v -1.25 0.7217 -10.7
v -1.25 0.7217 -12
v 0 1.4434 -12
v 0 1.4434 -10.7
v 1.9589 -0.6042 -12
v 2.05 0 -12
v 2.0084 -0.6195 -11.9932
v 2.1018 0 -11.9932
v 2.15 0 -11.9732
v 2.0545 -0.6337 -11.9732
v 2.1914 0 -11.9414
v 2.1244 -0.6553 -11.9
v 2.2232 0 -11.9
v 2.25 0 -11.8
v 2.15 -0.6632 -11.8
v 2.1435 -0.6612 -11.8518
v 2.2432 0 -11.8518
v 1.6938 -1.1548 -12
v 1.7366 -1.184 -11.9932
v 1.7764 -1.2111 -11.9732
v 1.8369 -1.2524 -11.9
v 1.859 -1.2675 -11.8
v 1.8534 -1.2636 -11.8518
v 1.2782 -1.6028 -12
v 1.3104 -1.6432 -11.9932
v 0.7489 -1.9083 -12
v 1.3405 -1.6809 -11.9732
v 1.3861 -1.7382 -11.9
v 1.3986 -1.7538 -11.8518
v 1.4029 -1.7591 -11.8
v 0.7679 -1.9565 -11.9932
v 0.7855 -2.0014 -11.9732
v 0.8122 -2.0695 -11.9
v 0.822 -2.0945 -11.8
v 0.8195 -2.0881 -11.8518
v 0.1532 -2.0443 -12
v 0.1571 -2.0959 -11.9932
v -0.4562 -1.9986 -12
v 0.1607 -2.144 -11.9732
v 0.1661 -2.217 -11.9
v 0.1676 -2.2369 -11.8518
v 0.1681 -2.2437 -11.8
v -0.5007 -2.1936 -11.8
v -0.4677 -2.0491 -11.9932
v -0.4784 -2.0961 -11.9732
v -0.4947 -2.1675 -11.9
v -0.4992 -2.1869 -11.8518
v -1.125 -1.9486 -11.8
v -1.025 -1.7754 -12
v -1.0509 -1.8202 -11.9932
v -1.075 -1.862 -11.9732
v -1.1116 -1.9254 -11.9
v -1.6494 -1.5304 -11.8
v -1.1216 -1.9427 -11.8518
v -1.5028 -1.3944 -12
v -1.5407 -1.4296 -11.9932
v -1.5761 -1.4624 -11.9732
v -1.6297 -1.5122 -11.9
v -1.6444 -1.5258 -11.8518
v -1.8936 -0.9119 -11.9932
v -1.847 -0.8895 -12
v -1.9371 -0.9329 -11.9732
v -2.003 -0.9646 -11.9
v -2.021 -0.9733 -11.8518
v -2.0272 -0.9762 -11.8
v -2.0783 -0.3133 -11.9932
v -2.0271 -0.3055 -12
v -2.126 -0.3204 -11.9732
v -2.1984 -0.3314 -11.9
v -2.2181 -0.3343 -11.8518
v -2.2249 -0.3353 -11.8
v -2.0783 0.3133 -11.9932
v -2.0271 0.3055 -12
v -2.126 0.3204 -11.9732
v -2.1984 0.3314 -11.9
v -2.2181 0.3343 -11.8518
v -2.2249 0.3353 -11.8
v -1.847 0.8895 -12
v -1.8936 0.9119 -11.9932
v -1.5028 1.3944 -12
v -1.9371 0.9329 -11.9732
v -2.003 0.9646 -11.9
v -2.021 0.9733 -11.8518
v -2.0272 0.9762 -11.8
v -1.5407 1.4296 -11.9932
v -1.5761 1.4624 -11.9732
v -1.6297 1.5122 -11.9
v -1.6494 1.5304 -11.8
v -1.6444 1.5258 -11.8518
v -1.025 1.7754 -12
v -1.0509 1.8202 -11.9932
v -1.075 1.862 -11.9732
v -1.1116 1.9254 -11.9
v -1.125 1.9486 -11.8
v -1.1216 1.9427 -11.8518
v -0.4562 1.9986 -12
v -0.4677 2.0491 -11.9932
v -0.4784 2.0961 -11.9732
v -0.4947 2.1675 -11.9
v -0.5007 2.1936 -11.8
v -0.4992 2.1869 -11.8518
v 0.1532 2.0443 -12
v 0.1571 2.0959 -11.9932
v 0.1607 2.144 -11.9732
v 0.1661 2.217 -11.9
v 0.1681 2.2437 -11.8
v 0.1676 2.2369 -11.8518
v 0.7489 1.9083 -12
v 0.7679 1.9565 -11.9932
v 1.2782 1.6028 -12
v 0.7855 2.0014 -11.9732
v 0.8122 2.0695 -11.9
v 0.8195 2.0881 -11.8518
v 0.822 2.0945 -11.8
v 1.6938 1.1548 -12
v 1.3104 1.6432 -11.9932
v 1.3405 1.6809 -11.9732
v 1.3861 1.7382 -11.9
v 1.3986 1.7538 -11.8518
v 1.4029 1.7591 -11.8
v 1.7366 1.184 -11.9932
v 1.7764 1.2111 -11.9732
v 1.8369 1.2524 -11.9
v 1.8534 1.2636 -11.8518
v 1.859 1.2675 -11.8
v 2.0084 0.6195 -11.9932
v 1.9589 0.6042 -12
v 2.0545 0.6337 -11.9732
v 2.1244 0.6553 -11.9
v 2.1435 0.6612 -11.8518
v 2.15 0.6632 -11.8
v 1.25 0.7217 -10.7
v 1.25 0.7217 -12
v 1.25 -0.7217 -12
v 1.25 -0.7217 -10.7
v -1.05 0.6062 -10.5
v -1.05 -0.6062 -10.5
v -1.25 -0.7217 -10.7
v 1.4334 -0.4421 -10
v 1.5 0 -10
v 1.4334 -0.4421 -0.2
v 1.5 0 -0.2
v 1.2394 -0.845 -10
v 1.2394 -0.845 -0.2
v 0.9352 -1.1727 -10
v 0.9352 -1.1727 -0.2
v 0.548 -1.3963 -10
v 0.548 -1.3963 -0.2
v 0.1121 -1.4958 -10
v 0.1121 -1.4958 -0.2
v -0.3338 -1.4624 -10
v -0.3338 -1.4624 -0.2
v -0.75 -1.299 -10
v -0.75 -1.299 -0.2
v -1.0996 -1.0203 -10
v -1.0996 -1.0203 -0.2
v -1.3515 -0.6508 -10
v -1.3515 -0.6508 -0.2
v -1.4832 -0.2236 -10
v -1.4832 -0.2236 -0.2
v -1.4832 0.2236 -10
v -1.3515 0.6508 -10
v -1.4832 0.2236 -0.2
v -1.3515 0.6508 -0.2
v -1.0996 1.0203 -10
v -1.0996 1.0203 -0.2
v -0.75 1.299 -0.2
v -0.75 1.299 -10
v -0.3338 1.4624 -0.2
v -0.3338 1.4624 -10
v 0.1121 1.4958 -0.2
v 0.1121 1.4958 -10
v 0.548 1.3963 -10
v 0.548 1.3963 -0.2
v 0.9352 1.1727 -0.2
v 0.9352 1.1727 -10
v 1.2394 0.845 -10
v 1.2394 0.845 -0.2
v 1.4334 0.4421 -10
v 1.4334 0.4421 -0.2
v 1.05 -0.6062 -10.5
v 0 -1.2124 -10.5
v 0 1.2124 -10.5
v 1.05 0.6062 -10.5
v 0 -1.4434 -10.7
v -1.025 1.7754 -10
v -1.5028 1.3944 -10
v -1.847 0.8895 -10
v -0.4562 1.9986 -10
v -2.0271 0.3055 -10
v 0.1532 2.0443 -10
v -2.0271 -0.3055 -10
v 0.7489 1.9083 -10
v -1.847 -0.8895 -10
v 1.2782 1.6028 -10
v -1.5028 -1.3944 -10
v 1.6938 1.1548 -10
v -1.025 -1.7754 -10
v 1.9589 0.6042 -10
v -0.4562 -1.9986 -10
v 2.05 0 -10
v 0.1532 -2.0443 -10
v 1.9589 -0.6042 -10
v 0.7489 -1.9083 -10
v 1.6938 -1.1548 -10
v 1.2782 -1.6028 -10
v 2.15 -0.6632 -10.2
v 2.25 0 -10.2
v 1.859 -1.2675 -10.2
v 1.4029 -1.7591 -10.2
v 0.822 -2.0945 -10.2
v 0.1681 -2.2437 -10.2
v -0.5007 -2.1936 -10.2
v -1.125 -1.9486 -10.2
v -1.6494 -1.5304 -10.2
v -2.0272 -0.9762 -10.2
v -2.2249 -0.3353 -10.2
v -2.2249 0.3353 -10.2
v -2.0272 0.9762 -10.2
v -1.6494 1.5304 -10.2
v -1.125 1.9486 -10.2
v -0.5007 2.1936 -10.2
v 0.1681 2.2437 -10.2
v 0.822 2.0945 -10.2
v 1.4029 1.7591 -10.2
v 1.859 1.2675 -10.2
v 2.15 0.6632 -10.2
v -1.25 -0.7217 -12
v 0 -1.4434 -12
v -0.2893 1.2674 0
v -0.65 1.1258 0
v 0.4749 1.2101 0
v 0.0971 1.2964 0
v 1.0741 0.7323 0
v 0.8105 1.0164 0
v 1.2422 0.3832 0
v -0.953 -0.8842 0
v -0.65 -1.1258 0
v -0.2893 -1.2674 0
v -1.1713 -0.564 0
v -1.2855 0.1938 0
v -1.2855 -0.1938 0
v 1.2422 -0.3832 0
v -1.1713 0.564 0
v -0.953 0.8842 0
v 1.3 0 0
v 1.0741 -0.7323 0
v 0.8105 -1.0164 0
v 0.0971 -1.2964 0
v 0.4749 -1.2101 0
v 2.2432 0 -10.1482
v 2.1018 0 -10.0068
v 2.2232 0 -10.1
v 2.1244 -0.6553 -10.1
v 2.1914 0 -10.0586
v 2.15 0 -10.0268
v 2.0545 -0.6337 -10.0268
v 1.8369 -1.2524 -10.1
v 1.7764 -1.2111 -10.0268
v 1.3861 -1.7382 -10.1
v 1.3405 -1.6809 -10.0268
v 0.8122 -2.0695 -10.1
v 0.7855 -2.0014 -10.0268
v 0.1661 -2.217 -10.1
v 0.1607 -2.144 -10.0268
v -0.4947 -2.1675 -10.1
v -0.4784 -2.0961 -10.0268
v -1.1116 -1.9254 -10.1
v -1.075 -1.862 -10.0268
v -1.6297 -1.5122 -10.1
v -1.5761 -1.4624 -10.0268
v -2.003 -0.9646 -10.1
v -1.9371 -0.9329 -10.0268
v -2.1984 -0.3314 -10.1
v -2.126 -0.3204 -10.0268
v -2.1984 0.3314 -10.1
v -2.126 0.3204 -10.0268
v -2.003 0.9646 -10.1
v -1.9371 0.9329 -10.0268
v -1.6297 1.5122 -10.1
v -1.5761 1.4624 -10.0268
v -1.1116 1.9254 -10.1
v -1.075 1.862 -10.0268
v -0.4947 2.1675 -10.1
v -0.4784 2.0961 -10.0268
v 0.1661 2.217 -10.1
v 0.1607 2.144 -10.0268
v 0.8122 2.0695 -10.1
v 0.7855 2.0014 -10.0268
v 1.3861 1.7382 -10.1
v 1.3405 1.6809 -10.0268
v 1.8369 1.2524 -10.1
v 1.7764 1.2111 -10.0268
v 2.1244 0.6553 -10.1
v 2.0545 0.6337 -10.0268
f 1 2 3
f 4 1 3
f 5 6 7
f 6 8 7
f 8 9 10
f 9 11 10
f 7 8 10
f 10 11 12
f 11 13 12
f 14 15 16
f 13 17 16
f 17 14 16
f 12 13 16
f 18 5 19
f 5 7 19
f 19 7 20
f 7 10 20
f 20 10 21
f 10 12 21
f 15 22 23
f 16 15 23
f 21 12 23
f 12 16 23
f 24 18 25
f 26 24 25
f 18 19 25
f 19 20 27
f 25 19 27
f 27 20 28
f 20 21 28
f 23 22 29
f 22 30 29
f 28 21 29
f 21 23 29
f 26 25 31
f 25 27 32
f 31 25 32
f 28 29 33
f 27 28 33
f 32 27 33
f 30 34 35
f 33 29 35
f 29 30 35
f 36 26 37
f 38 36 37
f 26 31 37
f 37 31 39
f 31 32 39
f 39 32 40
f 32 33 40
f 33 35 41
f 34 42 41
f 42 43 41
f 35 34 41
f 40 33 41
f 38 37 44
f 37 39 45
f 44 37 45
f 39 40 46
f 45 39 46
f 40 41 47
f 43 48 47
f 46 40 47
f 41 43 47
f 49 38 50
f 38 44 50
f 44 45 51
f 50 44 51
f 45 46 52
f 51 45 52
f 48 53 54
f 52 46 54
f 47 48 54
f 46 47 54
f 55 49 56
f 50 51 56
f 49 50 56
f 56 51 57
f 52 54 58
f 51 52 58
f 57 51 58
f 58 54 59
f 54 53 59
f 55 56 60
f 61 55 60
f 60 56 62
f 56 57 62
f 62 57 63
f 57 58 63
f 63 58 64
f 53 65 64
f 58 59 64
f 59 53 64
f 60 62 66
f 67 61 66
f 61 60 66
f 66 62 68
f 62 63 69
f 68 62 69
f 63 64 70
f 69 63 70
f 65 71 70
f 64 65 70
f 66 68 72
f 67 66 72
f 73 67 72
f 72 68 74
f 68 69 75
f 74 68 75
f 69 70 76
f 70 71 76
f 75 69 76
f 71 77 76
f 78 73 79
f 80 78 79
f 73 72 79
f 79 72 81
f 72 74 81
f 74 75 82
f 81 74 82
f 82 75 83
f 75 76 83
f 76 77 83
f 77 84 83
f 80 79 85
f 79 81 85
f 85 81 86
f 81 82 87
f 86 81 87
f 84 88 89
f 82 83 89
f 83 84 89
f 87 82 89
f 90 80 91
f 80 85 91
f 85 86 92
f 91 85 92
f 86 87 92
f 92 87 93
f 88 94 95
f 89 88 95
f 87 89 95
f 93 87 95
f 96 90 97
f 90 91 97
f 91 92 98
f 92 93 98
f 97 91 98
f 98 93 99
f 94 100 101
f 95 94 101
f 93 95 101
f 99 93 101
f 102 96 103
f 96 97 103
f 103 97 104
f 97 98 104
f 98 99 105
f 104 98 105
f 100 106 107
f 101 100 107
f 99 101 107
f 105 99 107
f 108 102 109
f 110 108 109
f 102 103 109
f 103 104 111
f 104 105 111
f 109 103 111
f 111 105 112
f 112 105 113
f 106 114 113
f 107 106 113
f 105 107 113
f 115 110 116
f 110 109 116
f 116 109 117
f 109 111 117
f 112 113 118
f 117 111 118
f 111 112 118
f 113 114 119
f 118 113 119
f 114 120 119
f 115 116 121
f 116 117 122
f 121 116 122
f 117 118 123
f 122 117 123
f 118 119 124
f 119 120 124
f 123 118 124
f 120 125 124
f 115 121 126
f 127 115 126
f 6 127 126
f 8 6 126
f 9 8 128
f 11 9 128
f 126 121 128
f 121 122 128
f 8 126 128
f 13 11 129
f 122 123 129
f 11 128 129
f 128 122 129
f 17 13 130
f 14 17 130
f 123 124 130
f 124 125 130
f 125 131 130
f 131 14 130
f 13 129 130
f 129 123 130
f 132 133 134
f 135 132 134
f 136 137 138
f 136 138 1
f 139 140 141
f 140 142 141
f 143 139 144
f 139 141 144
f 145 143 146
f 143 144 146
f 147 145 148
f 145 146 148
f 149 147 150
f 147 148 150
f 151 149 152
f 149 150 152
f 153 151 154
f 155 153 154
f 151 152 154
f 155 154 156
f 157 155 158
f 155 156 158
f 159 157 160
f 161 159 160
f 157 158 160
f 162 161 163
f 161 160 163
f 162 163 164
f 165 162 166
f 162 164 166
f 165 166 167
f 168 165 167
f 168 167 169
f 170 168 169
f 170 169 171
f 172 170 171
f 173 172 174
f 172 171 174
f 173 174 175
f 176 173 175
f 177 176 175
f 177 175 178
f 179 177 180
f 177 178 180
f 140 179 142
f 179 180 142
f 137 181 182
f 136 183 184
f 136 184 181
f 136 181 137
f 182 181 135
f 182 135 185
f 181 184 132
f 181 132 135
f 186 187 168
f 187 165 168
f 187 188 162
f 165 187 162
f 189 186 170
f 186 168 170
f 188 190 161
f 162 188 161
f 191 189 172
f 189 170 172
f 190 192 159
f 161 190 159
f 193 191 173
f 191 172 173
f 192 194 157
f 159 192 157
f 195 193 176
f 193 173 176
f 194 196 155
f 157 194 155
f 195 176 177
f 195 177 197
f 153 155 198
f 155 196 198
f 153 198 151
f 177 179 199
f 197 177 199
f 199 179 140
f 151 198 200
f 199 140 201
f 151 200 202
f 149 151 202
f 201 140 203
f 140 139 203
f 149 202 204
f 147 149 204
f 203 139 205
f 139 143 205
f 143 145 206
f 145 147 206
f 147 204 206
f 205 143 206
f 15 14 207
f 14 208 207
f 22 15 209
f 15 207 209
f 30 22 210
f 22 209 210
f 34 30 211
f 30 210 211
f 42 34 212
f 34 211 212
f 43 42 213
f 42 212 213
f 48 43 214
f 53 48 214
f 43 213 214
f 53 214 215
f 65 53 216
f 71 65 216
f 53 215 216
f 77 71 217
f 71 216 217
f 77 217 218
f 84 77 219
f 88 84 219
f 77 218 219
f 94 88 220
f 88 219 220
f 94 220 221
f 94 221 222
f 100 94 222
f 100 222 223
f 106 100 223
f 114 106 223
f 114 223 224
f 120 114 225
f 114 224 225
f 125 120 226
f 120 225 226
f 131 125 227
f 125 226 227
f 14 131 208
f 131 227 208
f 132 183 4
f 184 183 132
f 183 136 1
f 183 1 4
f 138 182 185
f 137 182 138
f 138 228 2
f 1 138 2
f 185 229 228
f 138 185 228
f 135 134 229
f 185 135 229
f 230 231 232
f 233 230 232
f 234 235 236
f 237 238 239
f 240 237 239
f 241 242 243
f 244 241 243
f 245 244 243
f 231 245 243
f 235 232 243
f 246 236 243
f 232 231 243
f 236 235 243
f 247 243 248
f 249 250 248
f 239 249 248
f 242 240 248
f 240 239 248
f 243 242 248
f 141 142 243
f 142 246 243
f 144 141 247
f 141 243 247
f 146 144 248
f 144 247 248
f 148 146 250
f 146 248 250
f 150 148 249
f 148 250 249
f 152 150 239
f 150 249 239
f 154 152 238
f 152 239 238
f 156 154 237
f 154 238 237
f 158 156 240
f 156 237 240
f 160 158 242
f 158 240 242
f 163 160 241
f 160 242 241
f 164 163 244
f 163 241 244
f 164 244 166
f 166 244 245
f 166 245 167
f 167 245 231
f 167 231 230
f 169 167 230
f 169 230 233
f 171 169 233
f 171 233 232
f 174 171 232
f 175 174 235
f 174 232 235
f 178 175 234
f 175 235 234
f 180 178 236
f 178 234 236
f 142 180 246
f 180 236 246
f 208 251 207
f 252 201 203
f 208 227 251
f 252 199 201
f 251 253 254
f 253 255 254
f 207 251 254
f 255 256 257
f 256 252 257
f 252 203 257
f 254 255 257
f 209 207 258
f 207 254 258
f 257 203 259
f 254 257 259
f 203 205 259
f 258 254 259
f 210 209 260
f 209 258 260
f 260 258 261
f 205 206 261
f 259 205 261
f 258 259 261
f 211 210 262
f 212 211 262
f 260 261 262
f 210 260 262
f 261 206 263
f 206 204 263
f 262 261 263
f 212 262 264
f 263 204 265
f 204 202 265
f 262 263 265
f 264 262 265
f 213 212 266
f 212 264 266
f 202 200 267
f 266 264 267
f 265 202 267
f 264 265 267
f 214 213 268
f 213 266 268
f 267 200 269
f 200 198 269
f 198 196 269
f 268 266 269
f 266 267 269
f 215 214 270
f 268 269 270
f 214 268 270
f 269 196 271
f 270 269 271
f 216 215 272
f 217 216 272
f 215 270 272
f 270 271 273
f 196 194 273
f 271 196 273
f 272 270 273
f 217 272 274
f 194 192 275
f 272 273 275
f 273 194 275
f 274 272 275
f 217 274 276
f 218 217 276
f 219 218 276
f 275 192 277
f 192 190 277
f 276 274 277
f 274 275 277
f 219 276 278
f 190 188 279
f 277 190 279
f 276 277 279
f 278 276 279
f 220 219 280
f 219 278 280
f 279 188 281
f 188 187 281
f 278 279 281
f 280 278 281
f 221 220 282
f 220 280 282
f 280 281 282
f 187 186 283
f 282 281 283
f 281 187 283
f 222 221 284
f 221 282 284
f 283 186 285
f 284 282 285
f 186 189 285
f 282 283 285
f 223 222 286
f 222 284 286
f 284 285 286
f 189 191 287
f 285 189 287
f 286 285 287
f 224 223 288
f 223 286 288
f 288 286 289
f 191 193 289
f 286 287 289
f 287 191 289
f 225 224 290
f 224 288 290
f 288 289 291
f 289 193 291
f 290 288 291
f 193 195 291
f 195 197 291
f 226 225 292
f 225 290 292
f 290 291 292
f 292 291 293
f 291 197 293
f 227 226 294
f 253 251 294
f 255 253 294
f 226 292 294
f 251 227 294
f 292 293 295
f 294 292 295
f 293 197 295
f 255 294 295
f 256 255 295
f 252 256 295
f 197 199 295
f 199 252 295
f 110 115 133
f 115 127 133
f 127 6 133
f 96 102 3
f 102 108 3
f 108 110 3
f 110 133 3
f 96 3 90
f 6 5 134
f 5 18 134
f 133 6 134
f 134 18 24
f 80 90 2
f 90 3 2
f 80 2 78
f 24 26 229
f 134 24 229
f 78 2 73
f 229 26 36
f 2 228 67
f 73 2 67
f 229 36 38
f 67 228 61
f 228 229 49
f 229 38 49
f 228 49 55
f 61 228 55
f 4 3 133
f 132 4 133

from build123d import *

# Parameters (mm, degrees)
CUT_EXTRUDE1_DEPTH = 1.5
CHAMFER1_SIZE      = 0.2


with BuildPart() as part:
    # Sketch1 → Revolve1 (revolve)
    with BuildSketch(Plane(origin=(0, 0, 0), x_dir=(1, 0, 0), z_dir=(0, 1, 0))):
        with BuildLine():
            Line((0, 12), (2.05, 12))
            ThreePointArc((2.05, 12), (2.191421356, 11.941421356), (2.25, 11.8))
            Line((2.25, 11.8), (2.25, 10.2))
            ThreePointArc((2.25, 10.2), (2.191421356, 10.058578644), (2.05, 10))
            Line((2.05, 10), (1.5, 10))
            Line((1.5, 10), (1.5, 0.2))
            Line((1.5, 0.2), (1.3, 0))
            Line((1.3, 0), (0, 0))
            Line((0, 0), (0, 12))
        make_face()
    revolve(axis=Axis((0, 0, 0), (0, 0, -1)))

    # Sketch2 → Cut-Extrude1 (cut)
    with BuildSketch(Plane(origin=(0, 0, -12), x_dir=(-1, 0, 0), z_dir=(0, 0, -1))):
        Polygon((1.25, 0.721687836), (0, 1.443375673), (-1.25, 0.721687836), (-1.25, -0.721687836), (0, -1.443375673), (1.25, -0.721687836), align=None)
    extrude(amount=-CUT_EXTRUDE1_DEPTH, mode=Mode.SUBTRACT)

    # Chamfer1
    chamfer1_edges = [part.edges().sort_by_distance(p)[0] for p in [
        (-1.25, 0, -10.5),
        (-0.625, -1.082531755, -10.5),
        (0.625, -1.082531755, -10.5),
        (1.25, 0, -10.5),
        (0.625, 1.082531755, -10.5),
        (-0.625, 1.082531755, -10.5),
    ]]
    chamfer(chamfer1_edges, length=CHAMFER1_SIZE)


solid = part.part
